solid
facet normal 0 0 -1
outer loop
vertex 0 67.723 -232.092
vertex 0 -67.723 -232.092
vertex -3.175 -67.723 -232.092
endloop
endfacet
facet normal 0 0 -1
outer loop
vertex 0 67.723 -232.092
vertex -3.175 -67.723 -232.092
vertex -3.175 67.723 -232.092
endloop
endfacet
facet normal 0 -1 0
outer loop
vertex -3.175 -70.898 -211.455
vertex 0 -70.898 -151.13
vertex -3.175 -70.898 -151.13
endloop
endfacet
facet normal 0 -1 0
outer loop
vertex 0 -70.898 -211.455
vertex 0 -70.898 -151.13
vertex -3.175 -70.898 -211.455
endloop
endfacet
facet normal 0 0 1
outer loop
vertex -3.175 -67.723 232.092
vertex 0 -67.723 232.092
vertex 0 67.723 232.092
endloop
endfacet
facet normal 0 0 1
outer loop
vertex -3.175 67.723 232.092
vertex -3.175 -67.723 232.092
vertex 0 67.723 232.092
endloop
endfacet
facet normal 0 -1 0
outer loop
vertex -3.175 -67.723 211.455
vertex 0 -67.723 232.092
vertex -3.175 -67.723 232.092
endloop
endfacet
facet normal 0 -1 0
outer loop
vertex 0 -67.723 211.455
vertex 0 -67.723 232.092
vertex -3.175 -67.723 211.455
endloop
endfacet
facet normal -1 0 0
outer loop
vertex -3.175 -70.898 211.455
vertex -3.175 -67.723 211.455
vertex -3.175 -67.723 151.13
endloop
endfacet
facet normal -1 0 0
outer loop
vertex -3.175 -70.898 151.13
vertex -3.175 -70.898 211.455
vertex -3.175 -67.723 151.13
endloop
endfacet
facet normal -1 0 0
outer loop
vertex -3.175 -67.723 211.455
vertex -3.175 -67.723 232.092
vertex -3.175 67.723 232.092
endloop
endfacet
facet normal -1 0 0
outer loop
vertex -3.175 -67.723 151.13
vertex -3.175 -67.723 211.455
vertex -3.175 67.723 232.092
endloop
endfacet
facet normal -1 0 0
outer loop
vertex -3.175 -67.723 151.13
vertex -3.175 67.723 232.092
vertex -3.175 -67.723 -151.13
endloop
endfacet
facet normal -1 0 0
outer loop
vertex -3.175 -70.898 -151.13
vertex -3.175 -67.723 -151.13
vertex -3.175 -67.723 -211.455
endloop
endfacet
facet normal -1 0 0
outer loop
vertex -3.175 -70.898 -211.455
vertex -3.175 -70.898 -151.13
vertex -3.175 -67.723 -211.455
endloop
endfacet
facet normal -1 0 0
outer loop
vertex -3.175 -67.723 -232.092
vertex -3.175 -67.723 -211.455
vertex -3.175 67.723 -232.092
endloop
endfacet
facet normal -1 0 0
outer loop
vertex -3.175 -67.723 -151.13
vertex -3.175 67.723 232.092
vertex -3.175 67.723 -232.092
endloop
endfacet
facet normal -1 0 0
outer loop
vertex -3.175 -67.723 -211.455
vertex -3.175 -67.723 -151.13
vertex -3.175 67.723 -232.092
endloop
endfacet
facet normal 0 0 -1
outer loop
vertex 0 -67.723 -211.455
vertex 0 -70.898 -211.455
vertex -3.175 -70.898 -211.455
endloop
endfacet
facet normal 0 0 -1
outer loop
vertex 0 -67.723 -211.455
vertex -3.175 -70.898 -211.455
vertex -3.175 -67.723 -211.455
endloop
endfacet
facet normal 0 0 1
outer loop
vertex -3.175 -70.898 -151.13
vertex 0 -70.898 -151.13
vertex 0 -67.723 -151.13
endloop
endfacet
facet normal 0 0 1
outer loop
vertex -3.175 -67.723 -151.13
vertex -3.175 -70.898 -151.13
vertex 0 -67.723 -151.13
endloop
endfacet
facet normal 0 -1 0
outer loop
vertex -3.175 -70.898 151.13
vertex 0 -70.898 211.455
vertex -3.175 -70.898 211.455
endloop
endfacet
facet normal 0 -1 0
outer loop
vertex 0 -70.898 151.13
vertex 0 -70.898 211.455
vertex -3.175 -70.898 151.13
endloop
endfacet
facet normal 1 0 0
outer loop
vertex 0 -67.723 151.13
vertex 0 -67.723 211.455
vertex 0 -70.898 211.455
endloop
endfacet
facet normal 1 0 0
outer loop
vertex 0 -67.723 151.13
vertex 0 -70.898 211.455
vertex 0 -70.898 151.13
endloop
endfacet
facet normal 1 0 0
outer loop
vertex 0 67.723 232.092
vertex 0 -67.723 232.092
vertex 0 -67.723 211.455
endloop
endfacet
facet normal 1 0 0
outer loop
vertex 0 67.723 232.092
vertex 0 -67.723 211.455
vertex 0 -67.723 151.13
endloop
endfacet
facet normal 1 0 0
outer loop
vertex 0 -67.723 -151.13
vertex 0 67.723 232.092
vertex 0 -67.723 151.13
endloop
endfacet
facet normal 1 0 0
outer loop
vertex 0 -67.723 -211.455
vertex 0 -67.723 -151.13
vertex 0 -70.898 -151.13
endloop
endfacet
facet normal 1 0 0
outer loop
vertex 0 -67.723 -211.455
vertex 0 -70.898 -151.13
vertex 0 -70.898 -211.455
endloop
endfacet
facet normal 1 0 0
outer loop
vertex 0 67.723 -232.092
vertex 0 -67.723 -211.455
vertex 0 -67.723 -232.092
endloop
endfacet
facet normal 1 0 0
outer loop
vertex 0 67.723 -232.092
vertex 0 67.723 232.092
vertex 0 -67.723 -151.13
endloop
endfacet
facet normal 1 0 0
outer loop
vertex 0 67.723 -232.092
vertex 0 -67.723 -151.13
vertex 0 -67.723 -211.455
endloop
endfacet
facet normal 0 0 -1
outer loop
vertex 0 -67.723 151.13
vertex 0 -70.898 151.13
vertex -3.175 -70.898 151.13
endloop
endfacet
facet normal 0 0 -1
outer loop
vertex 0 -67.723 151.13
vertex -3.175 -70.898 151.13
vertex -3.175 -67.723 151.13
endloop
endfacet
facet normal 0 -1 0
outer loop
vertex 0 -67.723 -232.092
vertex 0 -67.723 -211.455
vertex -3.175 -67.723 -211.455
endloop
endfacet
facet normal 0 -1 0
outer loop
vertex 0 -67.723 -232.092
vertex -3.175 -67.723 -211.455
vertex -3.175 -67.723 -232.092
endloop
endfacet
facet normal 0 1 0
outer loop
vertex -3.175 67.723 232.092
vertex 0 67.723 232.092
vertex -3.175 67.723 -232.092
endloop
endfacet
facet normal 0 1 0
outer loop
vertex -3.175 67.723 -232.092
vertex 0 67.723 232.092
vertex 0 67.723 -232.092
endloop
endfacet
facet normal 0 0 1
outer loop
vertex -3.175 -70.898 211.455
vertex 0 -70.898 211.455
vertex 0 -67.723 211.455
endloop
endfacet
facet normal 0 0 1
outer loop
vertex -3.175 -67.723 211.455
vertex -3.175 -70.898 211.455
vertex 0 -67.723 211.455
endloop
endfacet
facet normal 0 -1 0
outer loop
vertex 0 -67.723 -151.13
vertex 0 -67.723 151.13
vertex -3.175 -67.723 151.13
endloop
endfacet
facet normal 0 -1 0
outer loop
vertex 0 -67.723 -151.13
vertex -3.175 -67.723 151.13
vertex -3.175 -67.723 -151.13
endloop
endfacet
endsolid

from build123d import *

# Parameters (mm, degrees)
SKETCH1_W           = 464.185
SKETCH1_H           = 135.4455
BASE_FLANGE1_DEPTH  = 3.175
SKETCH2_W           = 60.325
SKETCH2_H           = 3.175
BOSS_EXTRUDE2_DEPTH = 3.175


# Sheet-metal steps are written as plain solids
with BuildPart() as part:
    # Sketch1 → Base-Flange1 (new body)
    with BuildSketch(Plane(origin=(0, 0, 0), x_dir=(0, 0, -1), z_dir=(1, 0, 0))):
        Rectangle(SKETCH1_W, SKETCH1_H)
    extrude(amount=-BASE_FLANGE1_DEPTH)

    # Sketch2 → Boss-Extrude2 (add)
    with BuildSketch(Plane(origin=(0, 0, 0), x_dir=(0, 0, -1), z_dir=(1, 0, 0))):
        with Locations((-181.2925, -69.31025)):
            Rectangle(SKETCH2_W, SKETCH2_H)
        with Locations((181.2925, -69.31025)):
            Rectangle(SKETCH2_W, SKETCH2_H)
    extrude(amount=-BOSS_EXTRUDE2_DEPTH)


solid = part.part
